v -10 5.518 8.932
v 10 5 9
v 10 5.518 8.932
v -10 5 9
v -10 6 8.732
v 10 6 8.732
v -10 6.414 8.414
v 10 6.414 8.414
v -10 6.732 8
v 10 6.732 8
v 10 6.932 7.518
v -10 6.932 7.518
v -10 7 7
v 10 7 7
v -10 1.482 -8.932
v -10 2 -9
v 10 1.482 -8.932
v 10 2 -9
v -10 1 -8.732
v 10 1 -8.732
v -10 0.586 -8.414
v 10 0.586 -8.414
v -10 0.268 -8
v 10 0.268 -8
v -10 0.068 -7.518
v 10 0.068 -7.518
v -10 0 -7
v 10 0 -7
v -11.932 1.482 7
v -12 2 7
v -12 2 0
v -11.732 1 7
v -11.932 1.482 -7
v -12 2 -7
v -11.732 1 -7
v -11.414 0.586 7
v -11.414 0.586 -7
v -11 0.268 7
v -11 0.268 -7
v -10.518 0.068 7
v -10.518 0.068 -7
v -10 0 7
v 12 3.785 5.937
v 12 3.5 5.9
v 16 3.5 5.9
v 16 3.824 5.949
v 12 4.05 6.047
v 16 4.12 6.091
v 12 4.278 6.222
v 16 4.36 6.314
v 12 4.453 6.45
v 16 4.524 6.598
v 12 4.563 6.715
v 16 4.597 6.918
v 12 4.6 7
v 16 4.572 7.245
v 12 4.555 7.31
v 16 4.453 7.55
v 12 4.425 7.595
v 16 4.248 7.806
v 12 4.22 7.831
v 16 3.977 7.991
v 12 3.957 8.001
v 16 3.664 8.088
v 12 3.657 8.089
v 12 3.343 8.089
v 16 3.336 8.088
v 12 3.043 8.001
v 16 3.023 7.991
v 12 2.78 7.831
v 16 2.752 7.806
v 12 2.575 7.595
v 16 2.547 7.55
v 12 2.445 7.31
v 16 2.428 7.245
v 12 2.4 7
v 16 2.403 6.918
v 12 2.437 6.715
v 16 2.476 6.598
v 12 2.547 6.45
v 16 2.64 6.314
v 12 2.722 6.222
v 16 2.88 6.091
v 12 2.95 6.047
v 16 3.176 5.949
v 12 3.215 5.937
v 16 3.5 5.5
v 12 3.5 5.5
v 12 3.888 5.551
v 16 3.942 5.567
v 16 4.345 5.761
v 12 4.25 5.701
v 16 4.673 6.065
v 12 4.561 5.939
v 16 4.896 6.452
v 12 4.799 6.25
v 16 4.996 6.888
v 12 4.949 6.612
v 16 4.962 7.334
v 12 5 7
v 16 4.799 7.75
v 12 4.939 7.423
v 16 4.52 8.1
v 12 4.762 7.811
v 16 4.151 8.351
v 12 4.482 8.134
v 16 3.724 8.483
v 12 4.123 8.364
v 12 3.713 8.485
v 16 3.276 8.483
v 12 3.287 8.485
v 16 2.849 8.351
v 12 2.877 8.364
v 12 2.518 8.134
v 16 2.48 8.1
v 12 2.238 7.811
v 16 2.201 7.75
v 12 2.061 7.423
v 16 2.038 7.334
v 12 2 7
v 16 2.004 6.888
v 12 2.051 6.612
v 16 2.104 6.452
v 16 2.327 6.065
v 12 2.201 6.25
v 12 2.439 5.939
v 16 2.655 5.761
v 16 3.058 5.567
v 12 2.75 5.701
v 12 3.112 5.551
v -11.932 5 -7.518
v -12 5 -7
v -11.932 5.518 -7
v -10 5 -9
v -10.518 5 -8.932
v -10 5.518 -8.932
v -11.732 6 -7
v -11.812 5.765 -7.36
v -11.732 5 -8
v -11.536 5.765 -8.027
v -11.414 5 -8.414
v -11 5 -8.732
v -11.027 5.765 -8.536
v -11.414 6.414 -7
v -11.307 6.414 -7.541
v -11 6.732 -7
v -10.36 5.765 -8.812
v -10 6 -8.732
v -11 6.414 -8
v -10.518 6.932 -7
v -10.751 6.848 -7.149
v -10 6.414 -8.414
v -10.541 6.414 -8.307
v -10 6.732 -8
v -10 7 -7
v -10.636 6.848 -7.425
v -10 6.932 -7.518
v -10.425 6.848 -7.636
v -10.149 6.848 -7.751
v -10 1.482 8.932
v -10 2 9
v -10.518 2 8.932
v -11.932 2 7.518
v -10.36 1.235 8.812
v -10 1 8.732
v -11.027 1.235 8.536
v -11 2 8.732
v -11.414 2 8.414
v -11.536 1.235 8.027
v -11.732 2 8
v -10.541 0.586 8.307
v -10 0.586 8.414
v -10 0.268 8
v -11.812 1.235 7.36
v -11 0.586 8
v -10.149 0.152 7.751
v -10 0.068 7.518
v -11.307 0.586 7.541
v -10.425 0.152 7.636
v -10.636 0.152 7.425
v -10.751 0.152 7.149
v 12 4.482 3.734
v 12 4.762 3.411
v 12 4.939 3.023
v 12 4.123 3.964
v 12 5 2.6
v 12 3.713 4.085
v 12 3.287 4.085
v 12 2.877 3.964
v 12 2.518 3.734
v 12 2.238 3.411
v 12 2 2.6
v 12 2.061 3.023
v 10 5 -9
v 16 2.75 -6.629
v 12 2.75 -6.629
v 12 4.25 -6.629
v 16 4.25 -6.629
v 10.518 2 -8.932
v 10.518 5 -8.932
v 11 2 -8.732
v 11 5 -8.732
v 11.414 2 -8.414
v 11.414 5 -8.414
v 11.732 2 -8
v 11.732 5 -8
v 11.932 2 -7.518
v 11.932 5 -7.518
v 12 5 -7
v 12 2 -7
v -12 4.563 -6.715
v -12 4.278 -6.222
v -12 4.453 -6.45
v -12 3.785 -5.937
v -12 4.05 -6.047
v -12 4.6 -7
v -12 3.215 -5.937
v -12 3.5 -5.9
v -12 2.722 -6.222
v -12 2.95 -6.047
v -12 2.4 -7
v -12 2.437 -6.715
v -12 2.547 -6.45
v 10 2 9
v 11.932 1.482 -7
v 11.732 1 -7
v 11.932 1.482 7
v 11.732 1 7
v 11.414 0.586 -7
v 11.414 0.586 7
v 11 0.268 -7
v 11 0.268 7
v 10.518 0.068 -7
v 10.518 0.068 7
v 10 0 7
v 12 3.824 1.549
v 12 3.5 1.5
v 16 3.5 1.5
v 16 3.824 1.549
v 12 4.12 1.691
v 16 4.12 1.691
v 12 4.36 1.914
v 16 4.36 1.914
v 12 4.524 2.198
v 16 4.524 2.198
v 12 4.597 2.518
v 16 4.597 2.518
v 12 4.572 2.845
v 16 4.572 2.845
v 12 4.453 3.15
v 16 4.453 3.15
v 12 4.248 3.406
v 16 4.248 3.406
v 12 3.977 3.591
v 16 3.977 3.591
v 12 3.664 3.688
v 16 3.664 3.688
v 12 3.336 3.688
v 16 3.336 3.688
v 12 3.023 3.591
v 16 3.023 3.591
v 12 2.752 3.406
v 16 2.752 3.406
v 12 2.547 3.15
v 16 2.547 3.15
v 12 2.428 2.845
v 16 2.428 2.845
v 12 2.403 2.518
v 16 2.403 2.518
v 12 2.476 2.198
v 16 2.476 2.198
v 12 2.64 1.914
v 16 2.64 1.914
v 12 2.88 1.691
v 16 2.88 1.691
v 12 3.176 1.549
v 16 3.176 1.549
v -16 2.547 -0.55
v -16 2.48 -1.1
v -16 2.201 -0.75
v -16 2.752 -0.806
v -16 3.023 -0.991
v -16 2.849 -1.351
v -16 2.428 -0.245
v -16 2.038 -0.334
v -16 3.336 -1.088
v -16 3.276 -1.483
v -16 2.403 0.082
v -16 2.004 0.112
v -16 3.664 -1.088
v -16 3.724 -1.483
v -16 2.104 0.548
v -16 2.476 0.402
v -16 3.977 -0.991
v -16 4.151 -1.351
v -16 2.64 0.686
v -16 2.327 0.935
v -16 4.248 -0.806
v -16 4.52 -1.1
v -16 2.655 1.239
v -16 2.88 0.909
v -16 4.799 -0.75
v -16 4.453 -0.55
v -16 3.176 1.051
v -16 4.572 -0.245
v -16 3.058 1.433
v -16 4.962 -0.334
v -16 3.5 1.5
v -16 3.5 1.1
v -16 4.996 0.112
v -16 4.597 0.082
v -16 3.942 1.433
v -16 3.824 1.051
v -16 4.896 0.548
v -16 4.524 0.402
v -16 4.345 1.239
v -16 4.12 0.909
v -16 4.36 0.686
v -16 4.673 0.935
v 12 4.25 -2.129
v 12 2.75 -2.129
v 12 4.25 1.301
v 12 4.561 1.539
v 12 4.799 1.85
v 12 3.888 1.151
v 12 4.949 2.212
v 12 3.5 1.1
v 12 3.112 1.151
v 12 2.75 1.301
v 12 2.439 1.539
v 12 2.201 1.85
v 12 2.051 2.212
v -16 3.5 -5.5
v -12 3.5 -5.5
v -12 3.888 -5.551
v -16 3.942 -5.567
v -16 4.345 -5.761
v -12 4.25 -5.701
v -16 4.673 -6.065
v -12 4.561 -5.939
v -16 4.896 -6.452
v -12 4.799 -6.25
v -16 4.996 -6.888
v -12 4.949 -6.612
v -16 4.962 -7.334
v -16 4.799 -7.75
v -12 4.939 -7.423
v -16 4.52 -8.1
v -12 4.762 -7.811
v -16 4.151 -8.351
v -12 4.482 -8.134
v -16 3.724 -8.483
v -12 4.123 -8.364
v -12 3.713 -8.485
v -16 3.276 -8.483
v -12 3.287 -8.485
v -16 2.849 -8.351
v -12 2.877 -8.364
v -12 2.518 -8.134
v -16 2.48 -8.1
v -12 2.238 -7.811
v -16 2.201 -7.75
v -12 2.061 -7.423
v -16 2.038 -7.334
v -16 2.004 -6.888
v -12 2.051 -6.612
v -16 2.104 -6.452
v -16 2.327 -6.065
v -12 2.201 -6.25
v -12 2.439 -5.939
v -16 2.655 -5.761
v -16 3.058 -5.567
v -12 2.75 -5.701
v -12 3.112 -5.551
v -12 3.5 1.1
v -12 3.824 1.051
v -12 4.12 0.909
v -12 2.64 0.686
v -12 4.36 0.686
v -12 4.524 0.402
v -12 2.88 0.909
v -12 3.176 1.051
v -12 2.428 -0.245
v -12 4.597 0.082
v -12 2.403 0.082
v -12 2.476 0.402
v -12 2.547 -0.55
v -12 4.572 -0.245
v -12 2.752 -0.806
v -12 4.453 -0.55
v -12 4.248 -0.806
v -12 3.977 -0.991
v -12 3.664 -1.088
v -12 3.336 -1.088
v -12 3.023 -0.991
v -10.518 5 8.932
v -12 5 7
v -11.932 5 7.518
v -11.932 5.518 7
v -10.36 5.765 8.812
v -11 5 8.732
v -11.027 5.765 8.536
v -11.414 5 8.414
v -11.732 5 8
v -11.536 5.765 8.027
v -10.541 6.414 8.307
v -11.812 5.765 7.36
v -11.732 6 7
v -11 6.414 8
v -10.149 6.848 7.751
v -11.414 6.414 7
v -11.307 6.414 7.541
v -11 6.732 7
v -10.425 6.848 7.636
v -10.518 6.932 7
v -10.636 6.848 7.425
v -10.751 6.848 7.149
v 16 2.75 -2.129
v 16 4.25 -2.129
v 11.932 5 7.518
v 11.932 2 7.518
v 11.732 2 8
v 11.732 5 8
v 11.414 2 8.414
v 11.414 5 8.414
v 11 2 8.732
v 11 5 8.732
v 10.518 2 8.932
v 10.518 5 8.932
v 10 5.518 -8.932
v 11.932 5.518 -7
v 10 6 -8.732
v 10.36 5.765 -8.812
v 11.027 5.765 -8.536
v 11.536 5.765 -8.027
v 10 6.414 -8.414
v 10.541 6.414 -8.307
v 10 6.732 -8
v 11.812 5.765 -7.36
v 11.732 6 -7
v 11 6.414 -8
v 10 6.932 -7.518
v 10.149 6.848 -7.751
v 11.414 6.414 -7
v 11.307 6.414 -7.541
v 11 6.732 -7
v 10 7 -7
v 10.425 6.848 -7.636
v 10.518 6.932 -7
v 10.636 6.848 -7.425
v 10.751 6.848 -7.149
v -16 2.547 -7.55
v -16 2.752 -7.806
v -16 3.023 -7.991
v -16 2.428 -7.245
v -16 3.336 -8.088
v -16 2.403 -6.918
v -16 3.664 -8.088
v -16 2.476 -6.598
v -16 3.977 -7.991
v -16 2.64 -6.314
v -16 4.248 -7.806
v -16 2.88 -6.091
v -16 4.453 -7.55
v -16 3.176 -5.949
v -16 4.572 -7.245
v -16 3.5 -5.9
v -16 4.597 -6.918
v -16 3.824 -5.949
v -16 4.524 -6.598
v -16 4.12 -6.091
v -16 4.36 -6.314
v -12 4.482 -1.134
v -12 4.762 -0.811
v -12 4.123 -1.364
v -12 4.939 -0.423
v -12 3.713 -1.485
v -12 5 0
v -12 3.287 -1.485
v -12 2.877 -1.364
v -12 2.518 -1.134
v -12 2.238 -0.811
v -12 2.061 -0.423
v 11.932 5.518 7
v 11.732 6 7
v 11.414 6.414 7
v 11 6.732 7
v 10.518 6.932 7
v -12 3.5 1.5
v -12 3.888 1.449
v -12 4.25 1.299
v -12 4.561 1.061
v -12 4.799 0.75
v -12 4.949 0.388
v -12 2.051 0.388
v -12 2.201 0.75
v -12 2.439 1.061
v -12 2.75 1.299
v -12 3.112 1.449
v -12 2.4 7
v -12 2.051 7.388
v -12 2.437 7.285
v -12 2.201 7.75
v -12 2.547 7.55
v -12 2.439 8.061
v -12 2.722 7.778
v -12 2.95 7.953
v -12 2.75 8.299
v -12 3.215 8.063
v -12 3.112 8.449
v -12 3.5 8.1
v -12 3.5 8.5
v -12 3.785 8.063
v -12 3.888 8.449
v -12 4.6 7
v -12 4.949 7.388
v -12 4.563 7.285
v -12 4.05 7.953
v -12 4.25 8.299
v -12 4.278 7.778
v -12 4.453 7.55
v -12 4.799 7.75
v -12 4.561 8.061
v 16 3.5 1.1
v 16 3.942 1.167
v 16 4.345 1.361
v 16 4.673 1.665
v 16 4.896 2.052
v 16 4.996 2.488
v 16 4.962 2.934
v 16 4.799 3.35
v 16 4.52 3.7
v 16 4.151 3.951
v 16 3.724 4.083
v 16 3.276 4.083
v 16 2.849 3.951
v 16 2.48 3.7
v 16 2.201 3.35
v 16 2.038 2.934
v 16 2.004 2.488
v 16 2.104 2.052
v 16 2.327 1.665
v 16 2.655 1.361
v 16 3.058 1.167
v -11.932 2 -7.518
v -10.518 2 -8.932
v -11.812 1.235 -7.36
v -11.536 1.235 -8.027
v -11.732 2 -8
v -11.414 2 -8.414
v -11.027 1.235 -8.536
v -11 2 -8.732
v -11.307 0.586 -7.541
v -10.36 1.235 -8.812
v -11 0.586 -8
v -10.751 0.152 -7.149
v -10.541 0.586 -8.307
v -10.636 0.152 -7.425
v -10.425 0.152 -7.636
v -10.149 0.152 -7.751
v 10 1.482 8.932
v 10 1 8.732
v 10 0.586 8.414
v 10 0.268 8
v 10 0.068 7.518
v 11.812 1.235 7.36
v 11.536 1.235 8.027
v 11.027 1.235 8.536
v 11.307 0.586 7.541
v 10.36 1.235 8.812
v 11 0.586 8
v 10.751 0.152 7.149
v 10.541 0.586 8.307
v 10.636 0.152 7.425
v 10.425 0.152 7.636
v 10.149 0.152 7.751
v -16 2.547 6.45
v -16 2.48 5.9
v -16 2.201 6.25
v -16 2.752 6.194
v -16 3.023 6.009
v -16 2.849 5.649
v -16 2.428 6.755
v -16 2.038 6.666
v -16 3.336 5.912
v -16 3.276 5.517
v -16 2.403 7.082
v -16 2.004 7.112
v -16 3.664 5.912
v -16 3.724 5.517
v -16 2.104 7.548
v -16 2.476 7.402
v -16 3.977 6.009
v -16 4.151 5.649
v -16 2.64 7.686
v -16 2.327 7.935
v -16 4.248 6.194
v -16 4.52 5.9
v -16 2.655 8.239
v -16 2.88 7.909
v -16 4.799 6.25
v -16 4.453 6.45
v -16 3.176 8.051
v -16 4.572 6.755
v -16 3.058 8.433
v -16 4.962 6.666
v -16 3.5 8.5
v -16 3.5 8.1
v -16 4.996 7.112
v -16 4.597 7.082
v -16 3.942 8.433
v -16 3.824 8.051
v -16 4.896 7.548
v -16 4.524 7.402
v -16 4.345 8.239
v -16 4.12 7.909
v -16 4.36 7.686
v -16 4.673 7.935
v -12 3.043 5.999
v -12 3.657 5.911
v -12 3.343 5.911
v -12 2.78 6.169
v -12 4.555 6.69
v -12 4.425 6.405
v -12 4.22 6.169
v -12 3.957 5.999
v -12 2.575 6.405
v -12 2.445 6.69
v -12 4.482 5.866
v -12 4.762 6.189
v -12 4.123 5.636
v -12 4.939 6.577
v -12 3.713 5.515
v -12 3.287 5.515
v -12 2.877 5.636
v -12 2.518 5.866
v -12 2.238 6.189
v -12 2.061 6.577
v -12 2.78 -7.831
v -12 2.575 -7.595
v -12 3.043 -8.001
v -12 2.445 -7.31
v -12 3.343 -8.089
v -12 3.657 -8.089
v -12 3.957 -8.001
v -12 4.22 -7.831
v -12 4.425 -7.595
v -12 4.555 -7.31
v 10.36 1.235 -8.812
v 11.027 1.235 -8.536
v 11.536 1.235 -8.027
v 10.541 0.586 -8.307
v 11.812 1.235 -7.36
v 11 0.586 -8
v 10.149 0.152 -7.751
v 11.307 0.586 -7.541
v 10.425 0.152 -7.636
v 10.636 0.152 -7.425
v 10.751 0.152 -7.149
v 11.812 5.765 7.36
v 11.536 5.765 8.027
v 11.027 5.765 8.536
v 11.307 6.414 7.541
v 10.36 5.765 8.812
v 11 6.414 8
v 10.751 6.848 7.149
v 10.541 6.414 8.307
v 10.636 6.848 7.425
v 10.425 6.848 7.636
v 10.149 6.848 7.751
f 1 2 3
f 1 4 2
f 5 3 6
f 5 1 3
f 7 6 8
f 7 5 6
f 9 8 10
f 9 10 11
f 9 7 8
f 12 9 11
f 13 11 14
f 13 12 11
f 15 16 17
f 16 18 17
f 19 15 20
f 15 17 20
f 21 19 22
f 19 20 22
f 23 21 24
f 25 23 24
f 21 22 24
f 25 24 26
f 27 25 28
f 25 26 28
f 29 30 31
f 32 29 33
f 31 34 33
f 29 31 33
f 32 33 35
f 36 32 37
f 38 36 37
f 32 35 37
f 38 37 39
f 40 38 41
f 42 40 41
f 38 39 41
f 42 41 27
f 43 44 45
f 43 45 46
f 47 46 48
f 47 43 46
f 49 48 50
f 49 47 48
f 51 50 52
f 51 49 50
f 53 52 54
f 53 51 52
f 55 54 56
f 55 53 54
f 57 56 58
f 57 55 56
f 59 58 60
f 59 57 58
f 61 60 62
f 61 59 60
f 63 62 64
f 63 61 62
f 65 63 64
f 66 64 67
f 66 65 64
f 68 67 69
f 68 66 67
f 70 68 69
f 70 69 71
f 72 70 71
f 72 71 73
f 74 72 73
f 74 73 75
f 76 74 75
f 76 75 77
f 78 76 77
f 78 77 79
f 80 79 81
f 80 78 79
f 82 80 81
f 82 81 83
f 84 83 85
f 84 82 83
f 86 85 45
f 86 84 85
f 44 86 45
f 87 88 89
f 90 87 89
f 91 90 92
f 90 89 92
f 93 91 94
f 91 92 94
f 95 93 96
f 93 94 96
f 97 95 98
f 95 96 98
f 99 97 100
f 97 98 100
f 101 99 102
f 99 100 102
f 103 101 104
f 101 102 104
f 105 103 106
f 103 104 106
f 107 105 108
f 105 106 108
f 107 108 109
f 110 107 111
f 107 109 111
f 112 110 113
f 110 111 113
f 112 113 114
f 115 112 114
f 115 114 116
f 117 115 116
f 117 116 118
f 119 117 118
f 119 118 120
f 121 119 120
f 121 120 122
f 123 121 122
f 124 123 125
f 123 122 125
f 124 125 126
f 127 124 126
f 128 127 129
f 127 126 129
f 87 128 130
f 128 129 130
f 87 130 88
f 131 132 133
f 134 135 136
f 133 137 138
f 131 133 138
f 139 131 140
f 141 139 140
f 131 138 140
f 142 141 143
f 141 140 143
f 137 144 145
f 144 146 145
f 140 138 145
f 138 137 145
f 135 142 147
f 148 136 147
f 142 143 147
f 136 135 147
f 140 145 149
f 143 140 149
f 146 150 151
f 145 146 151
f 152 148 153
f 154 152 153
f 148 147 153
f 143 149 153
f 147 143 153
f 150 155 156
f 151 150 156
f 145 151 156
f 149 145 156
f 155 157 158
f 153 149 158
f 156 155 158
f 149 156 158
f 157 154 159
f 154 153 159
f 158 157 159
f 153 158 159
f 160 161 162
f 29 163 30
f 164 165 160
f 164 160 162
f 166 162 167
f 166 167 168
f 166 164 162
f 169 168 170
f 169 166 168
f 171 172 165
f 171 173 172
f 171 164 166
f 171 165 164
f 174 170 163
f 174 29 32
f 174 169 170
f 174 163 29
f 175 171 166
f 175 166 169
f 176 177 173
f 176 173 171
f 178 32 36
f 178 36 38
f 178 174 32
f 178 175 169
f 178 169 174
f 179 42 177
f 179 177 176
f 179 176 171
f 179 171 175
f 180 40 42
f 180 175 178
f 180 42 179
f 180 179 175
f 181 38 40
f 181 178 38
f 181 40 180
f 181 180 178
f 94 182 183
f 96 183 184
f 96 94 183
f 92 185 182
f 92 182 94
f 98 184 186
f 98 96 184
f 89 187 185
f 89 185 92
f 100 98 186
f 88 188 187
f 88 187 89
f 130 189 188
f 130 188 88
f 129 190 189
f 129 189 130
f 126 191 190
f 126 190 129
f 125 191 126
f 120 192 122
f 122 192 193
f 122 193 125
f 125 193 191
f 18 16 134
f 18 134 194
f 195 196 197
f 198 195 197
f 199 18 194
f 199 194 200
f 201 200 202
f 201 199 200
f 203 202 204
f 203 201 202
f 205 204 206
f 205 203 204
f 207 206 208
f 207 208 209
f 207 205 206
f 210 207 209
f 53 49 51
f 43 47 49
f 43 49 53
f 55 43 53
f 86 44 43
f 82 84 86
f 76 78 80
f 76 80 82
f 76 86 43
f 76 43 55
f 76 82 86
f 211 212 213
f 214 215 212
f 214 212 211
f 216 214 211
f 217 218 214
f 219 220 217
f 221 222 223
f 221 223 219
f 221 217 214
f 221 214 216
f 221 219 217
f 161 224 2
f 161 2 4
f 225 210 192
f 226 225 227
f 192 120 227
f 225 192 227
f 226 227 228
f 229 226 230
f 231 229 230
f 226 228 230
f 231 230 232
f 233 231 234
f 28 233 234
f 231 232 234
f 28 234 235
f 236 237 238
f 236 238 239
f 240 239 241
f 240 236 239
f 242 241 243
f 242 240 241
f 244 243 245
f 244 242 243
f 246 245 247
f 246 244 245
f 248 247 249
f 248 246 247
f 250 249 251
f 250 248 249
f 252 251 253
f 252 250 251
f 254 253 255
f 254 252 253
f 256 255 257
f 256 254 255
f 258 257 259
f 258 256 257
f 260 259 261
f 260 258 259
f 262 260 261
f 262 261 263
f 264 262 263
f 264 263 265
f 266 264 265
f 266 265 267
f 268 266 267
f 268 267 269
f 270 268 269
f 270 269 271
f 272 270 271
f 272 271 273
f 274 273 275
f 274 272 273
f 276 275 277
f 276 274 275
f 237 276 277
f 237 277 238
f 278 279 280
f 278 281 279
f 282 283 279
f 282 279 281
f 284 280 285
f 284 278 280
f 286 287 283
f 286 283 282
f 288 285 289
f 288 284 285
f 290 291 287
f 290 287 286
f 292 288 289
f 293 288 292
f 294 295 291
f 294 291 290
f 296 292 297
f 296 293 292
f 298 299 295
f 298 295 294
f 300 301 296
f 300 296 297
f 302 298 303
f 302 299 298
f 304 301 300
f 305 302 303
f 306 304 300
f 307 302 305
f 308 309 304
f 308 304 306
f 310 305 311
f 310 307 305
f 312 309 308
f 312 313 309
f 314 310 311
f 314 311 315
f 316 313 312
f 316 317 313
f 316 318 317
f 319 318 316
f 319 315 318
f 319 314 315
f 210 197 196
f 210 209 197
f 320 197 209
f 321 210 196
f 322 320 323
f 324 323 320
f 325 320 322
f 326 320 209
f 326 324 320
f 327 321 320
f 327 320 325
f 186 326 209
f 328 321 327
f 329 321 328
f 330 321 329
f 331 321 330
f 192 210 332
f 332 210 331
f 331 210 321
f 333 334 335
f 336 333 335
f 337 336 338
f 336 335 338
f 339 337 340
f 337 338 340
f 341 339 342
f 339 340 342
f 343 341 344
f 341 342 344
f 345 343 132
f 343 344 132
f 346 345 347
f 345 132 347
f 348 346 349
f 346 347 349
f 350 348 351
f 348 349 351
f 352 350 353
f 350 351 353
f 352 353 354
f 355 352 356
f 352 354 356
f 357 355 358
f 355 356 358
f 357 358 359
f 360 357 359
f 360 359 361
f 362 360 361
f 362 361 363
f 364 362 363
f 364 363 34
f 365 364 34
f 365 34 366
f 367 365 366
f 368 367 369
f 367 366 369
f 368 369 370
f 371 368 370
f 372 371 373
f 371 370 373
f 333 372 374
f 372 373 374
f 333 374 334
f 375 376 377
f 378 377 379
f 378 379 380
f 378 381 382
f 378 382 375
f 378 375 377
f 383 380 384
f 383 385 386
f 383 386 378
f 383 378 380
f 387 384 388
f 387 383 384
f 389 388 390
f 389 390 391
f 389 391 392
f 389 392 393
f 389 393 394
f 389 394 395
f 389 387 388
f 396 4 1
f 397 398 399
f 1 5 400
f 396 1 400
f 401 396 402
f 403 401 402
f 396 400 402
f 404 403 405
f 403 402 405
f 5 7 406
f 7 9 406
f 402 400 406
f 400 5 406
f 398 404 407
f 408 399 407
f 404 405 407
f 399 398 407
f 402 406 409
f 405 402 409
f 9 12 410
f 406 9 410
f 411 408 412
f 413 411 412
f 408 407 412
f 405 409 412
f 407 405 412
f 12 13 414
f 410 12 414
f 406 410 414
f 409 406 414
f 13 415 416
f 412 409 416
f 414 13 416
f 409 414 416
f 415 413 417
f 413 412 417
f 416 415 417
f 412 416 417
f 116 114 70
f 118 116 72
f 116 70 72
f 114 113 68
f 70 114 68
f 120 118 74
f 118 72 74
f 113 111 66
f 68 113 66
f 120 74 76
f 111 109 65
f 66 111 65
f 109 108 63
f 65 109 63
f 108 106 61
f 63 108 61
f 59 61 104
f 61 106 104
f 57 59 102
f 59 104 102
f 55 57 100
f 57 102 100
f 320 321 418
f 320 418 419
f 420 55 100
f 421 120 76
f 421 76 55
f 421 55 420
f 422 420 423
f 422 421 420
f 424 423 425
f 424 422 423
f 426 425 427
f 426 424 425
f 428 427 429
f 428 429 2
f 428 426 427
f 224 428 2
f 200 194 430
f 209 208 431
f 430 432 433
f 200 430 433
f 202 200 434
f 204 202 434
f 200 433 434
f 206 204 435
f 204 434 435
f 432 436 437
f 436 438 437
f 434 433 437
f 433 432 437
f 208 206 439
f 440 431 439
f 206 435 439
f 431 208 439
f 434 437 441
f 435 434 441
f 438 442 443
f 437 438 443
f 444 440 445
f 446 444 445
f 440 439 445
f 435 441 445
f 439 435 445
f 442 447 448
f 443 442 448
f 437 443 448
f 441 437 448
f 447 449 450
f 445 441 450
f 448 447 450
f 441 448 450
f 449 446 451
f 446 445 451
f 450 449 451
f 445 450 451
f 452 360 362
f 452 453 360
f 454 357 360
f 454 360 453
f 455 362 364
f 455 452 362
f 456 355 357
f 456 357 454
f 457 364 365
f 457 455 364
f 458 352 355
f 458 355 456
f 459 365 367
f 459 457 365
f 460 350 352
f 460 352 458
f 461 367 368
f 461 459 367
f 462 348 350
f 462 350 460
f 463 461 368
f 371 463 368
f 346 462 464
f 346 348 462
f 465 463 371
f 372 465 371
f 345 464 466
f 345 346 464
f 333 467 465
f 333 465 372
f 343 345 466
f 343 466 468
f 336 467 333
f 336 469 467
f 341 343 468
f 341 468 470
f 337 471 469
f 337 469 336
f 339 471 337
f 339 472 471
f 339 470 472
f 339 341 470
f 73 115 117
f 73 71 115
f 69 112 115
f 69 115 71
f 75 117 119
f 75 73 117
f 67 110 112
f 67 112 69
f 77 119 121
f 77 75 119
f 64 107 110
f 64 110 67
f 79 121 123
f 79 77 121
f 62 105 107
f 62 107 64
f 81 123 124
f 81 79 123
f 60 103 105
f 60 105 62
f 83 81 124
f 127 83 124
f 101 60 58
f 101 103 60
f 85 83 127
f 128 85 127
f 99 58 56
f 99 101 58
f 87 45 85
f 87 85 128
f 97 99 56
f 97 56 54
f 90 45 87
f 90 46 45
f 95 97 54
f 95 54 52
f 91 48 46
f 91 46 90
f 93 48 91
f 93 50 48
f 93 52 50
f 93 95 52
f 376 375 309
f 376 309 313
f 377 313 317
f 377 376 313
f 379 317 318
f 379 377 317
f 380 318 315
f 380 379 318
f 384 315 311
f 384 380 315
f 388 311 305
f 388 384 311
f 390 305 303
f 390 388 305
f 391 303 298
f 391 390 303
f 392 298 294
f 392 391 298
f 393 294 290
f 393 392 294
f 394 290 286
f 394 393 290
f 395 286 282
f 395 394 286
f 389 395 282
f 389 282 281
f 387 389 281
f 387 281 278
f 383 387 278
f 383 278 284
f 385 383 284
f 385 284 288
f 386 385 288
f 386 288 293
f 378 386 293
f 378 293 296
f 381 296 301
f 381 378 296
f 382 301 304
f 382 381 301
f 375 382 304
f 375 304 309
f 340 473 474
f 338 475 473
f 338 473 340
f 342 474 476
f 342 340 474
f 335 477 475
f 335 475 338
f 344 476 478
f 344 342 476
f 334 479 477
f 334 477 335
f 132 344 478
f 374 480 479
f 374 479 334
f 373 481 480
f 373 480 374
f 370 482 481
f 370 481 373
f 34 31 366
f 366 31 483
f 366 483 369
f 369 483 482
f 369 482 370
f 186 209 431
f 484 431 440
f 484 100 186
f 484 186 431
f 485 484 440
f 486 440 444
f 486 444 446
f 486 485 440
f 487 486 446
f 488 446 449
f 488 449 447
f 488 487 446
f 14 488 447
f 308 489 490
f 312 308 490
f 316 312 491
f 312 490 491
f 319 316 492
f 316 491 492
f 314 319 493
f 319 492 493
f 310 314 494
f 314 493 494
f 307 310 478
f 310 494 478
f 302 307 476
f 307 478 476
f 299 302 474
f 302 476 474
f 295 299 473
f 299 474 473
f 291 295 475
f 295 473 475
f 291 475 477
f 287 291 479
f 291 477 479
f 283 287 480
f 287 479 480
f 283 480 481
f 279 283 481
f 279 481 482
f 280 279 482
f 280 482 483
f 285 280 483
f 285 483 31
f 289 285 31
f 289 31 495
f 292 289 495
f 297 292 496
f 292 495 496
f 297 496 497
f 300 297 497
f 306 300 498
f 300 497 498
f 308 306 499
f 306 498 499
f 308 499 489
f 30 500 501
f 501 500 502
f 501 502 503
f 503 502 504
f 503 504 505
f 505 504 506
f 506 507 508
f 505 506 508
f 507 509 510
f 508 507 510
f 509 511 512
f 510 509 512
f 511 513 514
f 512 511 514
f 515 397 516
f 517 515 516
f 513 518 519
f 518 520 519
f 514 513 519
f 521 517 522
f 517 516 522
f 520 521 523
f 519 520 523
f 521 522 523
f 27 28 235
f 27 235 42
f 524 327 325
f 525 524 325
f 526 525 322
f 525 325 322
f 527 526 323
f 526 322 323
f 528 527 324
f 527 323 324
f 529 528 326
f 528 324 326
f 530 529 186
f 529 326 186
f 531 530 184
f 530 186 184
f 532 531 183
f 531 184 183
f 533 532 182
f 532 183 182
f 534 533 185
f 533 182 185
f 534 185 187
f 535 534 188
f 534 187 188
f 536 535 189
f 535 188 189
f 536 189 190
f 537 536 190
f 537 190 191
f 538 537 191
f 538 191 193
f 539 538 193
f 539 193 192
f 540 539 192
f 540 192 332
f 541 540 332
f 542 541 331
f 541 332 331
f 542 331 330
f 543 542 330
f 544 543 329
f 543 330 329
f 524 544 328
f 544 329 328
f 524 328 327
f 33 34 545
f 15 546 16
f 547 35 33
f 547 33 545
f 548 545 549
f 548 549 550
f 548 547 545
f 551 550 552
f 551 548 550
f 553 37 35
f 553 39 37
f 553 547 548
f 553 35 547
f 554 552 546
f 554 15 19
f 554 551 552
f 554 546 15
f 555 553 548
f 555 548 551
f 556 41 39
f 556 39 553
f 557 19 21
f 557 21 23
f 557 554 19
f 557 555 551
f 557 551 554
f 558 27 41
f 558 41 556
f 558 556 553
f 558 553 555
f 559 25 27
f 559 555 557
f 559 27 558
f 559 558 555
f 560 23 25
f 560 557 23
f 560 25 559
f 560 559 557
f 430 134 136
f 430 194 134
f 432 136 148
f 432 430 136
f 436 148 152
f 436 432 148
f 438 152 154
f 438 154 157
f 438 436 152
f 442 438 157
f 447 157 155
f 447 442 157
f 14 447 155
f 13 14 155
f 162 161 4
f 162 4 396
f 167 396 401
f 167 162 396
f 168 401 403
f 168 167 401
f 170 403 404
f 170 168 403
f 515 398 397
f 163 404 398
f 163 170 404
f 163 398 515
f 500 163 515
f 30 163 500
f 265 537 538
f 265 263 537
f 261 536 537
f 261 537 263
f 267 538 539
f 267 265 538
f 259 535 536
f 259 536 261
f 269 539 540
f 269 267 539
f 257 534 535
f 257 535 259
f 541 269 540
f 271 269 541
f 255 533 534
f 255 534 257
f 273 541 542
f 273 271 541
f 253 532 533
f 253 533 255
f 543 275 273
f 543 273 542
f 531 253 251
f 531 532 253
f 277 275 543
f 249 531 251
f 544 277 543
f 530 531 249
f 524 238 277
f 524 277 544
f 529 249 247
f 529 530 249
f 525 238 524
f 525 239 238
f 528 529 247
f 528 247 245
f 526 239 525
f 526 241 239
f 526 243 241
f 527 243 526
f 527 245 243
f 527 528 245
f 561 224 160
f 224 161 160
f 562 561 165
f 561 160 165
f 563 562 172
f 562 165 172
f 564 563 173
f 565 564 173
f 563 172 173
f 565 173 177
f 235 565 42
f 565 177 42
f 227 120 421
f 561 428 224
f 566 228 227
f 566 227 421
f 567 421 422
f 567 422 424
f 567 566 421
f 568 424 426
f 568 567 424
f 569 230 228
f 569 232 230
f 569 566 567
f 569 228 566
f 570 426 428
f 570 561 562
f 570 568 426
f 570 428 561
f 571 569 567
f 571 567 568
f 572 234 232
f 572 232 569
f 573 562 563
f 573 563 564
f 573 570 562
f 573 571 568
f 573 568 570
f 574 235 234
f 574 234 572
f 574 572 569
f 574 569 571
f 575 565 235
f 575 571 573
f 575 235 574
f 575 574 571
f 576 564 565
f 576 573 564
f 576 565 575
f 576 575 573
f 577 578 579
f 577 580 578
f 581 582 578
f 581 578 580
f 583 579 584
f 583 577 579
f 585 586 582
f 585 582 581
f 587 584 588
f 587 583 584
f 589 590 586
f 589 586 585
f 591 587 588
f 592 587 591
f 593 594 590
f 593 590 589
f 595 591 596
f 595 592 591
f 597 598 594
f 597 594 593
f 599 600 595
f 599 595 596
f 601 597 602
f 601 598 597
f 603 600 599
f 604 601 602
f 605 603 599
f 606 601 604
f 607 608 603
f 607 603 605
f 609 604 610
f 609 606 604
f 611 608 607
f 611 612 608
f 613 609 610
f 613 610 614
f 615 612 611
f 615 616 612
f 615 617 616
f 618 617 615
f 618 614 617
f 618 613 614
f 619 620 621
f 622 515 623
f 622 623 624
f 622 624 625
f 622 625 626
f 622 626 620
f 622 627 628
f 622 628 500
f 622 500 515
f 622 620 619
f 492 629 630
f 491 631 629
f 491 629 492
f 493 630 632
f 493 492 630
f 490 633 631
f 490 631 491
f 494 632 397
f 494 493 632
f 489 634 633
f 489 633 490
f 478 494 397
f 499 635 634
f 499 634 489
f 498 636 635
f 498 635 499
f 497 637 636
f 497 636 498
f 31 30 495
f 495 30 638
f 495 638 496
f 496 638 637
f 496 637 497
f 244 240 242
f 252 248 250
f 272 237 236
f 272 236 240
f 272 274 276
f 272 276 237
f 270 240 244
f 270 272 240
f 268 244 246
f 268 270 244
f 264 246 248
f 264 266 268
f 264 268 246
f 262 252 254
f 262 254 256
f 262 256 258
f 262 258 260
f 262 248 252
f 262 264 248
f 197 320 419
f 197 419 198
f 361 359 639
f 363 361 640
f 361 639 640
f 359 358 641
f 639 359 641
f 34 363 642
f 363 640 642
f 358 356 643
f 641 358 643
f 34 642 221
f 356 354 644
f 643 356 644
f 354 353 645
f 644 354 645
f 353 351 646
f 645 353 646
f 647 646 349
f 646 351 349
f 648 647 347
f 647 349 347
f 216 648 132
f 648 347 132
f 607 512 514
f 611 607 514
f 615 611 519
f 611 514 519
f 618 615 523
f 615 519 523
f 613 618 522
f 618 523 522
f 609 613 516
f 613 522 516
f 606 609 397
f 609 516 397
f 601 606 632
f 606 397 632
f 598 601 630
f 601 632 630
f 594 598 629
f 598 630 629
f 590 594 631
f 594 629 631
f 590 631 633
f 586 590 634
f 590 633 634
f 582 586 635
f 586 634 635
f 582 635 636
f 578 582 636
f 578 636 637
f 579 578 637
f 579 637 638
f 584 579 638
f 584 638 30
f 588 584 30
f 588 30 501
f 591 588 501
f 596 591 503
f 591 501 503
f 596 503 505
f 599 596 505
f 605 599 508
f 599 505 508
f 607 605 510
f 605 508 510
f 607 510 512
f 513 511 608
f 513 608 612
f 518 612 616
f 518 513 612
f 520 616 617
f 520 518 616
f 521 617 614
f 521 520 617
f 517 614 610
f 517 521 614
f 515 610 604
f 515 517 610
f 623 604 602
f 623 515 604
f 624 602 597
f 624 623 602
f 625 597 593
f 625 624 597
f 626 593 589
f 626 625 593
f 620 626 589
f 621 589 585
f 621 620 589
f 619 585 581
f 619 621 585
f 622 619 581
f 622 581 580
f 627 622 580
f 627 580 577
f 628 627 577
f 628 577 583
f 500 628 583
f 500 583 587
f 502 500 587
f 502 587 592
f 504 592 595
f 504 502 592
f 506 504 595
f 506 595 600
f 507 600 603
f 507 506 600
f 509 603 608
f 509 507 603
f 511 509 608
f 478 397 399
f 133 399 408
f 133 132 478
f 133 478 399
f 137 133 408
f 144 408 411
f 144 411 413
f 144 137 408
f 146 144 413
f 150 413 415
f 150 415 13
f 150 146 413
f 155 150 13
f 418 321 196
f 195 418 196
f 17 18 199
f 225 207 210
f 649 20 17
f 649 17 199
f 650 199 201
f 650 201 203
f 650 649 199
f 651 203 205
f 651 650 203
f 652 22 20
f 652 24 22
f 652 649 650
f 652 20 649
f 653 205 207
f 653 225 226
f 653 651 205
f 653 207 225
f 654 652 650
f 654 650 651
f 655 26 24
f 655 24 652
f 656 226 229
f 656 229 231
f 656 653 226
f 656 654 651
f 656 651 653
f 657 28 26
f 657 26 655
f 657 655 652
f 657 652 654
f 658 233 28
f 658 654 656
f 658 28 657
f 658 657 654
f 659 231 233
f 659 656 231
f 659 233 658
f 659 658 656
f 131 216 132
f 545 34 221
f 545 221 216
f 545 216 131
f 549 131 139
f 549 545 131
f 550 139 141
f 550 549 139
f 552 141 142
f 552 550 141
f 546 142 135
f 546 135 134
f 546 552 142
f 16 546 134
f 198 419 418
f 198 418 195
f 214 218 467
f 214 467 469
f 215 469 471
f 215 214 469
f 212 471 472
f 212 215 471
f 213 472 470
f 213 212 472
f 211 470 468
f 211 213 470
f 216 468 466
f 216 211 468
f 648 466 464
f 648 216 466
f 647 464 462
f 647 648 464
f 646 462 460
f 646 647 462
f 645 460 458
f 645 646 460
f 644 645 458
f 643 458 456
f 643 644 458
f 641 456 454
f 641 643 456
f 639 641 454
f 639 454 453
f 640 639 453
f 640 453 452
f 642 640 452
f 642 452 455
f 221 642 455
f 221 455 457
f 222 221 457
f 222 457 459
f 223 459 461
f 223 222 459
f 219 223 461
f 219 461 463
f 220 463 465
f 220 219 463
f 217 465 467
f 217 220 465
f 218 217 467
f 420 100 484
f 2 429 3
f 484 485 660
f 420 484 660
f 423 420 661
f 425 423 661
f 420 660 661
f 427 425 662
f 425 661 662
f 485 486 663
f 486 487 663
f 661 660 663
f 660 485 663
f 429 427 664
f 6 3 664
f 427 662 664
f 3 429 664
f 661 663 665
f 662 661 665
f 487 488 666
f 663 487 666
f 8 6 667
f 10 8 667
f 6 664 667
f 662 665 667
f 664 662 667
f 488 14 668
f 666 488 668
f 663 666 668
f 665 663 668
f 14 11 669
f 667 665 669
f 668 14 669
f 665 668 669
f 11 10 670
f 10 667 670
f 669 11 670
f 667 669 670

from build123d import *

# Parameters (mm, degrees)
BOSS_EXTRUDE1_DEPTH = 7
FILLET1_R           = 2
SKETCH2_R           = 1.5
SKETCH2_R_2         = 1.1
BOSS_EXTRUDE2_DEPTH = 4
SKETCH3_R           = 1.5
SKETCH3_R_2         = 1.1
SKETCH3_W           = 4.5
SKETCH3_H           = 1.5
BOSS_EXTRUDE3_DEPTH = 4


with BuildPart() as part:
    # Sketch1 → Boss-Extrude1 (new body)
    with BuildSketch(Plane(origin=(0, 0, 0), x_dir=(1, 0, 0), z_dir=(0, 1, 0))):
        with BuildLine():
            Line((-10, 9), (10, 9))
            ThreePointArc((10, 9), (11.414213562, 8.414213562), (12, 7))
            Line((12, 7), (12, -7))
            ThreePointArc((12, -7), (11.414213562, -8.414213562), (10, -9))
            Line((10, -9), (-10, -9))
            ThreePointArc((-10, -9), (-11.414213562, -8.414213562), (-12, -7))
            Line((-12, -7), (-12, 7))
            ThreePointArc((-12, 7), (-11.414213562, 8.414213562), (-10, 9))
        make_face()
    extrude(amount=BOSS_EXTRUDE1_DEPTH)

    # Fillet1
    fillet1_edges = [part.edges().sort_by_distance(p)[0] for p in [
        (-12, 0, 0),
        (-11.414213562, 0, -8.414213562),
        (0, 0, -9),
        (11.414213562, 0, -8.414213562),
        (-11.414213562, 7, -8.414213562),
        (-12, 7, 0),
        (-11.414213562, 7, 8.414213562),
        (0, 7, 9),
        (11.414213562, 7, 8.414213562),
        (12, 7, 0),
        (11.414213562, 7, -8.414213562),
        (12, 0, 0),
        (0, 7, -9),
        (11.414213562, 0, 8.414213562),
        (0, 0, 9),
        (-11.414213562, 0, 8.414213562),
    ]]
    fillet(fillet1_edges, radius=FILLET1_R)

    # Sketch2 → Boss-Extrude2 (add)
    with BuildSketch(Plane.ZY.offset(12)):
        with Locations((-7, 3.5)):
            Circle(SKETCH2_R)
        with Locations((-7, 3.5)):
            Circle(SKETCH2_R_2, mode=Mode.SUBTRACT)
        with Locations((0, 3.5)):
            Circle(SKETCH2_R)
        with Locations((0, 3.5)):
            Circle(SKETCH2_R_2, mode=Mode.SUBTRACT)
        with Locations((7, 3.5)):
            Circle(SKETCH2_R)
        with Locations((7, 3.5)):
            Circle(SKETCH2_R_2, mode=Mode.SUBTRACT)
    extrude(amount=BOSS_EXTRUDE2_DEPTH)

    # Sketch3 → Boss-Extrude3 (add)
    with BuildSketch(Plane(origin=(12, 0, 0), x_dir=(0, 0, -1), z_dir=(1, 0, 0))):
        with Locations((-7, 3.5)):
            Circle(SKETCH3_R)
        with Locations((-7, 3.5)):
            Circle(SKETCH3_R_2, mode=Mode.SUBTRACT)
        with Locations((-2.6, 3.5)):
            Circle(SKETCH3_R)
        with Locations((-2.6, 3.5)):
            Circle(SKETCH3_R_2, mode=Mode.SUBTRACT)
        with Locations((4.379211167, 3.5)):
            Rectangle(SKETCH3_W, SKETCH3_H)
    extrude(amount=BOSS_EXTRUDE3_DEPTH)


solid = part.part
